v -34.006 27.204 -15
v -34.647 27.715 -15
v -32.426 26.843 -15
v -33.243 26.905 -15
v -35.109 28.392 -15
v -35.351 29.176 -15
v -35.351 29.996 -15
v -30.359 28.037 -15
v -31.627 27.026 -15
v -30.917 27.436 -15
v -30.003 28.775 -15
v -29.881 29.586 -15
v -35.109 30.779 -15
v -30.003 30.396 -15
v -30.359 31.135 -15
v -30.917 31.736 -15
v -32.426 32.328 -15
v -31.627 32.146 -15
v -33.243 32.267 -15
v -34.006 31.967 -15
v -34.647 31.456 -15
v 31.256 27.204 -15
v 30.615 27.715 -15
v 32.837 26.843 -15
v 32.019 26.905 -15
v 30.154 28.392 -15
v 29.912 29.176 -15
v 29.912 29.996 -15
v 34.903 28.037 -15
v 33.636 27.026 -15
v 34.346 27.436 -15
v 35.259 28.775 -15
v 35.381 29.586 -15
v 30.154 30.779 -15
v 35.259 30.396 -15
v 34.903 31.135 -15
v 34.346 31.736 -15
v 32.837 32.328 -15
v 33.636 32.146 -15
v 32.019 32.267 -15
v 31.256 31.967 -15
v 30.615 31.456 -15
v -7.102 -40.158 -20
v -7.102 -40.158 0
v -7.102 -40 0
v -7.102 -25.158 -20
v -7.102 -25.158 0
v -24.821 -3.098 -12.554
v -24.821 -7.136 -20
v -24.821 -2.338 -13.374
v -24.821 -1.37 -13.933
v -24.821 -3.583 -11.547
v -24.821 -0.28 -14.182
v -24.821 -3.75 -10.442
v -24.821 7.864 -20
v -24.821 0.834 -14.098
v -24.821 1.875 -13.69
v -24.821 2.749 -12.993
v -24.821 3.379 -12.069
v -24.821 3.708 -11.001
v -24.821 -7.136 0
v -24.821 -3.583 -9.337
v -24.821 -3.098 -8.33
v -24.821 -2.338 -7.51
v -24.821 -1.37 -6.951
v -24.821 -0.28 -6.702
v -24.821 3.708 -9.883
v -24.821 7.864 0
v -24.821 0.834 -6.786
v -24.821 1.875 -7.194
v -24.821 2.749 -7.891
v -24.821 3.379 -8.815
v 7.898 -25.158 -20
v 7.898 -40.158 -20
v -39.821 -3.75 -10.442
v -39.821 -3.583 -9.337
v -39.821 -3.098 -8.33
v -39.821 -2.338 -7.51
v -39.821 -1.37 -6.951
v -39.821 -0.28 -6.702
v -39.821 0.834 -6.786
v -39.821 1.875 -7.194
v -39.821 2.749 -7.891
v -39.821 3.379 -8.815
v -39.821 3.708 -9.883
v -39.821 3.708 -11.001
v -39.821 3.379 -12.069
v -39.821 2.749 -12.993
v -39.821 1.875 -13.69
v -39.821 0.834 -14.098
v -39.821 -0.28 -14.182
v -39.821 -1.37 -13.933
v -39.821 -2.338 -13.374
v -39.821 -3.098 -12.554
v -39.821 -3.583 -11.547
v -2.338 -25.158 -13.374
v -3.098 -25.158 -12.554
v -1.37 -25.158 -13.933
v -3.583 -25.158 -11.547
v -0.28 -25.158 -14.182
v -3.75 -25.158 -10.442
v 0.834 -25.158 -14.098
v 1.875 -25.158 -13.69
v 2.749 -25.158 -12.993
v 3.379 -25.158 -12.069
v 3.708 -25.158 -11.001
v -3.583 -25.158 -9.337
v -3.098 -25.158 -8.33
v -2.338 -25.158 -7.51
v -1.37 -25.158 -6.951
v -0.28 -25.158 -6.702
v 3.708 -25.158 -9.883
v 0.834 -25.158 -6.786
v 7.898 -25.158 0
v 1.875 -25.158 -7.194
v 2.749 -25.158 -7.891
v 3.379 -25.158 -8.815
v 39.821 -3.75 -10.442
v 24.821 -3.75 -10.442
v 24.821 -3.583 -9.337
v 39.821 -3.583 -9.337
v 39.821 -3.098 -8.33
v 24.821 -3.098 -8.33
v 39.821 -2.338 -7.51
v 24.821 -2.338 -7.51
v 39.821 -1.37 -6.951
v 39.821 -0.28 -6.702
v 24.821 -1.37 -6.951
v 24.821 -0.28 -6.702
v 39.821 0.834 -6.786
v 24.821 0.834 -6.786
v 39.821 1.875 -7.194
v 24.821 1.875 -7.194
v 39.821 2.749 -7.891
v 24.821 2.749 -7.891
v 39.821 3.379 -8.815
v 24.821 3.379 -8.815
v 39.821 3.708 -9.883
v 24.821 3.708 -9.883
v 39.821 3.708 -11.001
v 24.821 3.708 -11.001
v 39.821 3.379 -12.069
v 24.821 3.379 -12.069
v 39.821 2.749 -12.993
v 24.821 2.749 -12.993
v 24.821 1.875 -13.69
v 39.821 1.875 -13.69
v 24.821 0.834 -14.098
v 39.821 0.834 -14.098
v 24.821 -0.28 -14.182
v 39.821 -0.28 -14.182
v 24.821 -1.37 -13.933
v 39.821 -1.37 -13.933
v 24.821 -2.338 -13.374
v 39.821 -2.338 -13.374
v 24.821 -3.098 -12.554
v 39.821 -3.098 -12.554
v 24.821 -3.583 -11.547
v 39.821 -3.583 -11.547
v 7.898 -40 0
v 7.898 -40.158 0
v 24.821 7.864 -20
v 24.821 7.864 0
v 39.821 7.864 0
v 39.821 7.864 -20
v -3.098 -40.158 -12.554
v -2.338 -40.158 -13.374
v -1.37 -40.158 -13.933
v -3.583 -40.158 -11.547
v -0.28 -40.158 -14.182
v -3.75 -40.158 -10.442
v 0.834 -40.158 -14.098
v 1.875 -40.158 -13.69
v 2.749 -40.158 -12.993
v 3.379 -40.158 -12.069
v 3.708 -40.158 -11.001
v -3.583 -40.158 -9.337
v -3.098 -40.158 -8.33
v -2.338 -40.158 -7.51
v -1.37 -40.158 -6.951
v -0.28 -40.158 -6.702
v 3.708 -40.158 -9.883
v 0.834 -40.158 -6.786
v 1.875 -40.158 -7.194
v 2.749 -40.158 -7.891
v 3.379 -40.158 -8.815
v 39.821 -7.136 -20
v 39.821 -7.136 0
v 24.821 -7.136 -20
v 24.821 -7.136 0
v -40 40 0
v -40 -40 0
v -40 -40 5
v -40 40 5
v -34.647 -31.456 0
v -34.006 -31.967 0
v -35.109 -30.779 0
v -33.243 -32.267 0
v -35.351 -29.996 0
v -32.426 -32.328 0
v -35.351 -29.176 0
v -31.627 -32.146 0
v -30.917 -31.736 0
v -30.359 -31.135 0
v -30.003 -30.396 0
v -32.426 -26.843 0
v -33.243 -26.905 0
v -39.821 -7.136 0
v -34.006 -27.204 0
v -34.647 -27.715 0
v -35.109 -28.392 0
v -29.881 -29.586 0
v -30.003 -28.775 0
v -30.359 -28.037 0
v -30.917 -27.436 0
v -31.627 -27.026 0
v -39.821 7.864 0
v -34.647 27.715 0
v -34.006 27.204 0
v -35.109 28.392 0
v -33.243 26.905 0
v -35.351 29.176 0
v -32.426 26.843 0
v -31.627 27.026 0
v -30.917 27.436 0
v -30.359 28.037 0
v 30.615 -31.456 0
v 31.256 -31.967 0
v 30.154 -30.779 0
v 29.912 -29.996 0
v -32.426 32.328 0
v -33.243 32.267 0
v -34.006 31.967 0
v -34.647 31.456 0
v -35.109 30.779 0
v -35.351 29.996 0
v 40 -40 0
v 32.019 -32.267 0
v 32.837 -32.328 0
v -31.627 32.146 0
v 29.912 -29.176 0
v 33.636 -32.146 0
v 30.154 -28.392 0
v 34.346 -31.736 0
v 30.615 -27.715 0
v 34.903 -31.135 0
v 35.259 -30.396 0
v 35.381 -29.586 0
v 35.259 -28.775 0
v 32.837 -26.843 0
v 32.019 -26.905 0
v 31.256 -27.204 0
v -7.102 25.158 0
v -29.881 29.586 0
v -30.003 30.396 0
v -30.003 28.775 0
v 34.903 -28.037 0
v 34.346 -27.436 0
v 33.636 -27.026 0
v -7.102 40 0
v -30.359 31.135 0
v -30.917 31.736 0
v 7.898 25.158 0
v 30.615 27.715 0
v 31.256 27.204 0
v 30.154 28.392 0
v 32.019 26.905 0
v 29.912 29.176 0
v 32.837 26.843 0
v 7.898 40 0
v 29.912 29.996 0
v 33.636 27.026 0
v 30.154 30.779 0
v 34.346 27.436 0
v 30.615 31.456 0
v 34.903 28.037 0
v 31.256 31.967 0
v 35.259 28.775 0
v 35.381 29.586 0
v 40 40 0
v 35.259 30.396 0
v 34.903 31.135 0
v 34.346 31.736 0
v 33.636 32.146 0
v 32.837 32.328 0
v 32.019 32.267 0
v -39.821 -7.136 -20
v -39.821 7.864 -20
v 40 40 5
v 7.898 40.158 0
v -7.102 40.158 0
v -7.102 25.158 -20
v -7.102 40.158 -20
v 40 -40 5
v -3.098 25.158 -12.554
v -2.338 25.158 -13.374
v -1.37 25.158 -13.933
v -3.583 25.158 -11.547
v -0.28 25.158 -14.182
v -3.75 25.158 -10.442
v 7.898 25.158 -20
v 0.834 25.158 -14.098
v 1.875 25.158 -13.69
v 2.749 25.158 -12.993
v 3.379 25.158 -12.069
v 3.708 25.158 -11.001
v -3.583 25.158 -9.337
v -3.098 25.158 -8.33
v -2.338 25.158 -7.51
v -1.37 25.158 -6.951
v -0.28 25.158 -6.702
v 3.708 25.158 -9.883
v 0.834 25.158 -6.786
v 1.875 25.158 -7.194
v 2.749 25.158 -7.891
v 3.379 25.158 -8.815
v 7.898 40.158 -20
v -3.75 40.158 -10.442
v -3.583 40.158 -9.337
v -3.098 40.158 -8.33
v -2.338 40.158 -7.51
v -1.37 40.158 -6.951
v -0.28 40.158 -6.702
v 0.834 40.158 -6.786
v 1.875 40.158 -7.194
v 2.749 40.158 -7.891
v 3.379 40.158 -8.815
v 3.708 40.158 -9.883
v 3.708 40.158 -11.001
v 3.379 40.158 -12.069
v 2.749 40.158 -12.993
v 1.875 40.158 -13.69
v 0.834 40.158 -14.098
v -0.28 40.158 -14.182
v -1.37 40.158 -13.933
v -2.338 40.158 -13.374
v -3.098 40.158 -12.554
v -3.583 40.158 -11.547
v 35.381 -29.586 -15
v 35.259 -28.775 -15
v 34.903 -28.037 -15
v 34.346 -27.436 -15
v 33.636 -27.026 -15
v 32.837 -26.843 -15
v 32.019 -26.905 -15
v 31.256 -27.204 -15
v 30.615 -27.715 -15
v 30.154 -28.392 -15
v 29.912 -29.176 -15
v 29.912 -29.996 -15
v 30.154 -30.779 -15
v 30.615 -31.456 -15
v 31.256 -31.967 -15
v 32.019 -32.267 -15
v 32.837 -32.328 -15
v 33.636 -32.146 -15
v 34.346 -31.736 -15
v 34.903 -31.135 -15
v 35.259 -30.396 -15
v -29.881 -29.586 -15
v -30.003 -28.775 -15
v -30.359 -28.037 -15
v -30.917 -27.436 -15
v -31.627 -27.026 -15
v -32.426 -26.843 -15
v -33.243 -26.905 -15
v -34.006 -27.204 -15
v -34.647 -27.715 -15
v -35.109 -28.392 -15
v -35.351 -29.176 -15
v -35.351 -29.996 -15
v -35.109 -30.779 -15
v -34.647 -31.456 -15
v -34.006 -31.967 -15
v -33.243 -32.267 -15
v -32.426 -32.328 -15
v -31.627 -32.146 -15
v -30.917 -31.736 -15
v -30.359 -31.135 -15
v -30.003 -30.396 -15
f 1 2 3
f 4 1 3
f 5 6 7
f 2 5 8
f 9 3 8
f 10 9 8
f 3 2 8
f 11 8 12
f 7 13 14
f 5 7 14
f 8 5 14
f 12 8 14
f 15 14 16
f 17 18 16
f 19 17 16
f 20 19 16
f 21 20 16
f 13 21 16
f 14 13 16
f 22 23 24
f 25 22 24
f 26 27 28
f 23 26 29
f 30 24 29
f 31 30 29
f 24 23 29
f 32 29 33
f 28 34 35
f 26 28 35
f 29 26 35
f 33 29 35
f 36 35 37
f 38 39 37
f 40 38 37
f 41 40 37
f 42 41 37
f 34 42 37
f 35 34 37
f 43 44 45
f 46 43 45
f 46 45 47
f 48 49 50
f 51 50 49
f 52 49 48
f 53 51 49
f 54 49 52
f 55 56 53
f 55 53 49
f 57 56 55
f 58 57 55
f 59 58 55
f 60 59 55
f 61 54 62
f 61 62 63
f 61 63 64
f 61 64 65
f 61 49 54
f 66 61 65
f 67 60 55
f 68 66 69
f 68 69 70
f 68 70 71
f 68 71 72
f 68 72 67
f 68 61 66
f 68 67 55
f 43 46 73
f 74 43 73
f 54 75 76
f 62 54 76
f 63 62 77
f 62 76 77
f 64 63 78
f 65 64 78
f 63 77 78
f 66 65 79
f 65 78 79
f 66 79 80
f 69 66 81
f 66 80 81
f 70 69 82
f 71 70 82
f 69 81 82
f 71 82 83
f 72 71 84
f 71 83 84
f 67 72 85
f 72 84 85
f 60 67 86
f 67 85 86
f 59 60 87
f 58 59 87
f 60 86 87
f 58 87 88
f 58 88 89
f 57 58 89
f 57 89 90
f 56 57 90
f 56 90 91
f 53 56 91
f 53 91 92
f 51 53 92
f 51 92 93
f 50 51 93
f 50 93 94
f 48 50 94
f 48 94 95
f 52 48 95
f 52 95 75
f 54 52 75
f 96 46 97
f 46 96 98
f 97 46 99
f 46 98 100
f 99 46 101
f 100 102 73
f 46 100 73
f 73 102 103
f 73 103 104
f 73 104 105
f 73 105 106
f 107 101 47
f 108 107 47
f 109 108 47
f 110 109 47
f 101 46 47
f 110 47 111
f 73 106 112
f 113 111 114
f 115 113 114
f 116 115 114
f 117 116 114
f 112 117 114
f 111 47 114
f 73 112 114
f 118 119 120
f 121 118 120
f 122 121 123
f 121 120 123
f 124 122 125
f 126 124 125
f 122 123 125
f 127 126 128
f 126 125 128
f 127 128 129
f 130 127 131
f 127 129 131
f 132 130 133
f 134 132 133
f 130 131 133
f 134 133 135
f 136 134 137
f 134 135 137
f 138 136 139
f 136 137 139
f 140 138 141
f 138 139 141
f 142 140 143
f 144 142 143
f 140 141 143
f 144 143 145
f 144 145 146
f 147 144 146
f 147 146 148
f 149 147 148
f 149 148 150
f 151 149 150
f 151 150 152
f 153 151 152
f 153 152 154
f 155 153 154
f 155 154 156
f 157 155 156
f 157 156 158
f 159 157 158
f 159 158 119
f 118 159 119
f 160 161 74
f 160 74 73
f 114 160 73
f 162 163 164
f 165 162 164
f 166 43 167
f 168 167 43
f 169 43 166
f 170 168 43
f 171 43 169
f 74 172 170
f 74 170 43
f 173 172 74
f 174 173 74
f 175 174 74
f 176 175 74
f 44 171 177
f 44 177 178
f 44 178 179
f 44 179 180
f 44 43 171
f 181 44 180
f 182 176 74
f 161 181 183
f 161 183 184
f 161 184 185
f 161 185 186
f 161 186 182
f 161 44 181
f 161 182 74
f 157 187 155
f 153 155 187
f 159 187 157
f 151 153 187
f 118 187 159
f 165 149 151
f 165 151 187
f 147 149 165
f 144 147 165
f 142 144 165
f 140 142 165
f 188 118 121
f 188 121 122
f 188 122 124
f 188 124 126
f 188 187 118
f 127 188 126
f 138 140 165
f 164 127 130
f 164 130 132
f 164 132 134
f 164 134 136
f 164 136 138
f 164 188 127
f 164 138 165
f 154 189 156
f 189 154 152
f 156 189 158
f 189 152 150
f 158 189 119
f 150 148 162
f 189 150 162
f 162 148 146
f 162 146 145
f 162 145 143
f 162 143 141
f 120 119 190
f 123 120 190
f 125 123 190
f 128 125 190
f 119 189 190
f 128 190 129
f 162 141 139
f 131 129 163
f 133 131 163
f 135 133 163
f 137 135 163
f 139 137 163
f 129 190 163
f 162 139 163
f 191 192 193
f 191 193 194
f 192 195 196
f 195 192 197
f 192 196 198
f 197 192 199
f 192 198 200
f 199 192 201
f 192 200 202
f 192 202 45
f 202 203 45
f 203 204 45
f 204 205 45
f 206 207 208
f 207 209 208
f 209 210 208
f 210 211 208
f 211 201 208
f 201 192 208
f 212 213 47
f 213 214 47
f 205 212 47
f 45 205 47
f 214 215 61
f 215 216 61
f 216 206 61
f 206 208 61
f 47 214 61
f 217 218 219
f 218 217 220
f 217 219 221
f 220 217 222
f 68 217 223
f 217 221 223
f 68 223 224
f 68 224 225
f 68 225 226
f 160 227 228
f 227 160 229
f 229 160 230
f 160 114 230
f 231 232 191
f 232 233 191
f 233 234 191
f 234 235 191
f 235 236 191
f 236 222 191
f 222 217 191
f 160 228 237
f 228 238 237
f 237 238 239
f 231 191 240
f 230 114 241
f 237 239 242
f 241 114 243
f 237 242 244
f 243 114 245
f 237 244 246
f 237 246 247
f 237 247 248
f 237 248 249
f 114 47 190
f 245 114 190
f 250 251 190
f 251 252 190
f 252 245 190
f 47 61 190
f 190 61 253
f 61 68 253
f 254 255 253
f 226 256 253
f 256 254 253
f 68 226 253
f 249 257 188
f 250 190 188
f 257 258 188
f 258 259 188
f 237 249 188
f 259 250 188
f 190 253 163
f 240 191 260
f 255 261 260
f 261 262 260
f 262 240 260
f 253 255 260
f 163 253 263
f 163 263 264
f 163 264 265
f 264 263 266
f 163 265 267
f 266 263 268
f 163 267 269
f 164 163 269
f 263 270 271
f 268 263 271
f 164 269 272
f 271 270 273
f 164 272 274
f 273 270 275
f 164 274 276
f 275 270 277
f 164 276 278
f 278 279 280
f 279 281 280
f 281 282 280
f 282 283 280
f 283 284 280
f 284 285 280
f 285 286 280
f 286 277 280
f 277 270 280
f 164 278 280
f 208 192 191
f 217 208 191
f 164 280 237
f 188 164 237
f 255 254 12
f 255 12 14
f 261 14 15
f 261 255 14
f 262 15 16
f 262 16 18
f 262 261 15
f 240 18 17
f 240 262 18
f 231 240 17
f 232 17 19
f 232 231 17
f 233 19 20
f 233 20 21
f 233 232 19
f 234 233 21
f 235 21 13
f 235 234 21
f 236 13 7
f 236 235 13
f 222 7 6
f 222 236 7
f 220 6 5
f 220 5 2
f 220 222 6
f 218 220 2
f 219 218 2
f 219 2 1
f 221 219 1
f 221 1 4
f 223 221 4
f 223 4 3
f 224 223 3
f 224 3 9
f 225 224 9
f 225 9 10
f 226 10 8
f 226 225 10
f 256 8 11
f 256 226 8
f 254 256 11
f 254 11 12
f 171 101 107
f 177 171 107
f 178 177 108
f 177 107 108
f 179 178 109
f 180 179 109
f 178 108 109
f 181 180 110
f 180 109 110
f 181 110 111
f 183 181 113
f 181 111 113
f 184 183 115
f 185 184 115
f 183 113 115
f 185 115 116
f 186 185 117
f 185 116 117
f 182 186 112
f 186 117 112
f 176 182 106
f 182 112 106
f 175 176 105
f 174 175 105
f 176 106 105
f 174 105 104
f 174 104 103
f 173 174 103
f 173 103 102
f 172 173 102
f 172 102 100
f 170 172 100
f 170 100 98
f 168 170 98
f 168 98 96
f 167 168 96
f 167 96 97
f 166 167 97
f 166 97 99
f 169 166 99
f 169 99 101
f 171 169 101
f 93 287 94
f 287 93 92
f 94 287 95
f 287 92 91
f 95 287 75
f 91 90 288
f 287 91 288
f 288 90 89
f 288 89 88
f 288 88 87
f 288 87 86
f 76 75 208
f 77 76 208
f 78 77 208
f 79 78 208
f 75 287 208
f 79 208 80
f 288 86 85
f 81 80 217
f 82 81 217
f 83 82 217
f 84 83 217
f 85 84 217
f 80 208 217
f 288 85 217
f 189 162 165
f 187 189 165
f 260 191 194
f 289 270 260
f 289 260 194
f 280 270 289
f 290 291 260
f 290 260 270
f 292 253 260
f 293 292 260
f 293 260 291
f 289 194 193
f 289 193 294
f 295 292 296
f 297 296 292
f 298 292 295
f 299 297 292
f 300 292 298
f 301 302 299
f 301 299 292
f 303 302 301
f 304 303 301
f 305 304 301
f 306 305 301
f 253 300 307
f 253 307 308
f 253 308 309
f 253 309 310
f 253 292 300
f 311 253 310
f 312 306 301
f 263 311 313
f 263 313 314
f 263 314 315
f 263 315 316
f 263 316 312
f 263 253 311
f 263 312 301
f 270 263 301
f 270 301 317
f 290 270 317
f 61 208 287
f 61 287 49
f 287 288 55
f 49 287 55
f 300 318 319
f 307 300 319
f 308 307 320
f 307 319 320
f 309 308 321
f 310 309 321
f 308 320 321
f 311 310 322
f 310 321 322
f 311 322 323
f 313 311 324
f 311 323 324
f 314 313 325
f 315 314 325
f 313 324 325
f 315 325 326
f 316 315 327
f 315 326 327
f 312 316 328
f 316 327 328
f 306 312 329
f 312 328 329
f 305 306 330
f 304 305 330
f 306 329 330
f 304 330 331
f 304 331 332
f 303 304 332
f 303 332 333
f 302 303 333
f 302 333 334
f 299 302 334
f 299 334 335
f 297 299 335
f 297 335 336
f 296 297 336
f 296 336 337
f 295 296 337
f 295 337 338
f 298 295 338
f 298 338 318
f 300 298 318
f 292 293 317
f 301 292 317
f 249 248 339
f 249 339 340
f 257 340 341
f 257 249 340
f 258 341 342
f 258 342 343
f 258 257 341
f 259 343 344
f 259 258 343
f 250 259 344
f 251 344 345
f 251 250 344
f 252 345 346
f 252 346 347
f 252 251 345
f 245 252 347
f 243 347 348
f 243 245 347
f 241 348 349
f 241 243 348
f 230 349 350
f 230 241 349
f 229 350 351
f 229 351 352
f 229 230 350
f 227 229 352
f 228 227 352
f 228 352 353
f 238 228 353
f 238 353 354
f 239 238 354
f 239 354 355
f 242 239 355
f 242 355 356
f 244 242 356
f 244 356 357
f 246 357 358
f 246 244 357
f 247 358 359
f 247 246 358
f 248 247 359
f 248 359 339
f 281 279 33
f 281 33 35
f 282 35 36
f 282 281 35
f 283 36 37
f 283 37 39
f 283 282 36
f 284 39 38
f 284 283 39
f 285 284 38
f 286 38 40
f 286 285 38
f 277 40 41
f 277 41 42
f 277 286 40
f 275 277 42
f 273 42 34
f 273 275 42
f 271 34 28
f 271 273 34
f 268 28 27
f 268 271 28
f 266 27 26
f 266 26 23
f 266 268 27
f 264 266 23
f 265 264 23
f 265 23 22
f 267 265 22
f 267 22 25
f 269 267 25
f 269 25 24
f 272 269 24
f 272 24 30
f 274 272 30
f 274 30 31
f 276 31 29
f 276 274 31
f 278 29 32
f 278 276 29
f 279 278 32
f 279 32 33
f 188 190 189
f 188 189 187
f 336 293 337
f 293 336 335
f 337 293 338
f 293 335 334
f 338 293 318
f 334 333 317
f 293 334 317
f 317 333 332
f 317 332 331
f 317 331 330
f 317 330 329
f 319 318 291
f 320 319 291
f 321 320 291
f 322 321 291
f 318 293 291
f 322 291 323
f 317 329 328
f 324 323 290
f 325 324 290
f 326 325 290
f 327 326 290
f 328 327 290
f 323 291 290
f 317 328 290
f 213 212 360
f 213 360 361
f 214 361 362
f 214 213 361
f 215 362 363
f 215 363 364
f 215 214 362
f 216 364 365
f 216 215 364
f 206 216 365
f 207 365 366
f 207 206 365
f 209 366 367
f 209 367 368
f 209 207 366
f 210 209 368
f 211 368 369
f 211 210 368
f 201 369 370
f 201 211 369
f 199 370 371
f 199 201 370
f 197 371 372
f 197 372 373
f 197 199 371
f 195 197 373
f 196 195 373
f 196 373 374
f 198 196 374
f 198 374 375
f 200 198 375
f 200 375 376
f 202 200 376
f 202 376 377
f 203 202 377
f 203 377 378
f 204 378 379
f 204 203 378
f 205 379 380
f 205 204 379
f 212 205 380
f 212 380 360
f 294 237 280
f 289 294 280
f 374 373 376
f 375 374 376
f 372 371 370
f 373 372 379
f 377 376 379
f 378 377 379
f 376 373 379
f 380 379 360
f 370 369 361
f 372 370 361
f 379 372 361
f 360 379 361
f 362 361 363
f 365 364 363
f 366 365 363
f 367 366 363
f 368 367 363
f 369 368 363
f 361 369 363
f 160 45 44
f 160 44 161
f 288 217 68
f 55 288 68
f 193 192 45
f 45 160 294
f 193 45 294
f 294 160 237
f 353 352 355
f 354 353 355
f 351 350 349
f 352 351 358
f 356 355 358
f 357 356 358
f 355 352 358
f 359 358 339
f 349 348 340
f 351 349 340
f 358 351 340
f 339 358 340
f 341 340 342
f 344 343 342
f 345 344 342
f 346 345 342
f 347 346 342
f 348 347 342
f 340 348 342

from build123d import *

# Parameters (mm, degrees)
F0_W      = 80
F0_H      = 80
F1_DEPTH  = 5
F2_W      = 15
F2_H      = 15
F3_DEPTH  = 20
F6_D      = 7.5
F9_D      = 7.5
F10_R     = 2.75
F11_DEPTH = 15


with BuildPart() as f1:
    # F0 (on Top) → F1 (new body)
    with BuildSketch(Plane.XY):
        Rectangle(F0_W, F0_H)
    extrude(amount=F1_DEPTH)

    # F2 (on Top) → F3 (join)
    with BuildSketch(Plane.XY):
        with Locations((-32.3208275437, 0.3642106242)):
            Rectangle(F2_W, F2_H)
        with Locations((32.3208275437, 0.3642106242)):
            Rectangle(F2_W, F2_H)
        with Locations((0.3983431309, -32.6577353477)):
            Rectangle(F2_W, F2_H)
        with Locations((0.3983431309, 32.6577353477)):
            Rectangle(F2_W, F2_H)
    extrude(amount=-F3_DEPTH)

    # F6 (through all)
    with Locations(Plane.XZ.offset(41.1)):
        with Locations((0, -10.4419896379)):
            Hole(F6_D / 2)

    # F9 (through all)
    with Locations(Plane.YZ.offset(59.3)):
        with Locations((0, -10.4419896379)):
            Hole(F9_D / 2)

    # F10 (on Top) → F11 (join)
    with BuildSketch(Plane.XY):
        with Locations((-32.6312184334, 29.5856371522)):
            Circle(F10_R)
        with Locations((32.6312184334, 29.5856371522)):
            Circle(F10_R)
        with Locations((32.6312184334, -29.5856371522)):
            Circle(F10_R)
        with Locations((-32.6312184334, -29.5856371522)):
            Circle(F10_R)
    extrude(amount=-F11_DEPTH)


solid = f1.part
